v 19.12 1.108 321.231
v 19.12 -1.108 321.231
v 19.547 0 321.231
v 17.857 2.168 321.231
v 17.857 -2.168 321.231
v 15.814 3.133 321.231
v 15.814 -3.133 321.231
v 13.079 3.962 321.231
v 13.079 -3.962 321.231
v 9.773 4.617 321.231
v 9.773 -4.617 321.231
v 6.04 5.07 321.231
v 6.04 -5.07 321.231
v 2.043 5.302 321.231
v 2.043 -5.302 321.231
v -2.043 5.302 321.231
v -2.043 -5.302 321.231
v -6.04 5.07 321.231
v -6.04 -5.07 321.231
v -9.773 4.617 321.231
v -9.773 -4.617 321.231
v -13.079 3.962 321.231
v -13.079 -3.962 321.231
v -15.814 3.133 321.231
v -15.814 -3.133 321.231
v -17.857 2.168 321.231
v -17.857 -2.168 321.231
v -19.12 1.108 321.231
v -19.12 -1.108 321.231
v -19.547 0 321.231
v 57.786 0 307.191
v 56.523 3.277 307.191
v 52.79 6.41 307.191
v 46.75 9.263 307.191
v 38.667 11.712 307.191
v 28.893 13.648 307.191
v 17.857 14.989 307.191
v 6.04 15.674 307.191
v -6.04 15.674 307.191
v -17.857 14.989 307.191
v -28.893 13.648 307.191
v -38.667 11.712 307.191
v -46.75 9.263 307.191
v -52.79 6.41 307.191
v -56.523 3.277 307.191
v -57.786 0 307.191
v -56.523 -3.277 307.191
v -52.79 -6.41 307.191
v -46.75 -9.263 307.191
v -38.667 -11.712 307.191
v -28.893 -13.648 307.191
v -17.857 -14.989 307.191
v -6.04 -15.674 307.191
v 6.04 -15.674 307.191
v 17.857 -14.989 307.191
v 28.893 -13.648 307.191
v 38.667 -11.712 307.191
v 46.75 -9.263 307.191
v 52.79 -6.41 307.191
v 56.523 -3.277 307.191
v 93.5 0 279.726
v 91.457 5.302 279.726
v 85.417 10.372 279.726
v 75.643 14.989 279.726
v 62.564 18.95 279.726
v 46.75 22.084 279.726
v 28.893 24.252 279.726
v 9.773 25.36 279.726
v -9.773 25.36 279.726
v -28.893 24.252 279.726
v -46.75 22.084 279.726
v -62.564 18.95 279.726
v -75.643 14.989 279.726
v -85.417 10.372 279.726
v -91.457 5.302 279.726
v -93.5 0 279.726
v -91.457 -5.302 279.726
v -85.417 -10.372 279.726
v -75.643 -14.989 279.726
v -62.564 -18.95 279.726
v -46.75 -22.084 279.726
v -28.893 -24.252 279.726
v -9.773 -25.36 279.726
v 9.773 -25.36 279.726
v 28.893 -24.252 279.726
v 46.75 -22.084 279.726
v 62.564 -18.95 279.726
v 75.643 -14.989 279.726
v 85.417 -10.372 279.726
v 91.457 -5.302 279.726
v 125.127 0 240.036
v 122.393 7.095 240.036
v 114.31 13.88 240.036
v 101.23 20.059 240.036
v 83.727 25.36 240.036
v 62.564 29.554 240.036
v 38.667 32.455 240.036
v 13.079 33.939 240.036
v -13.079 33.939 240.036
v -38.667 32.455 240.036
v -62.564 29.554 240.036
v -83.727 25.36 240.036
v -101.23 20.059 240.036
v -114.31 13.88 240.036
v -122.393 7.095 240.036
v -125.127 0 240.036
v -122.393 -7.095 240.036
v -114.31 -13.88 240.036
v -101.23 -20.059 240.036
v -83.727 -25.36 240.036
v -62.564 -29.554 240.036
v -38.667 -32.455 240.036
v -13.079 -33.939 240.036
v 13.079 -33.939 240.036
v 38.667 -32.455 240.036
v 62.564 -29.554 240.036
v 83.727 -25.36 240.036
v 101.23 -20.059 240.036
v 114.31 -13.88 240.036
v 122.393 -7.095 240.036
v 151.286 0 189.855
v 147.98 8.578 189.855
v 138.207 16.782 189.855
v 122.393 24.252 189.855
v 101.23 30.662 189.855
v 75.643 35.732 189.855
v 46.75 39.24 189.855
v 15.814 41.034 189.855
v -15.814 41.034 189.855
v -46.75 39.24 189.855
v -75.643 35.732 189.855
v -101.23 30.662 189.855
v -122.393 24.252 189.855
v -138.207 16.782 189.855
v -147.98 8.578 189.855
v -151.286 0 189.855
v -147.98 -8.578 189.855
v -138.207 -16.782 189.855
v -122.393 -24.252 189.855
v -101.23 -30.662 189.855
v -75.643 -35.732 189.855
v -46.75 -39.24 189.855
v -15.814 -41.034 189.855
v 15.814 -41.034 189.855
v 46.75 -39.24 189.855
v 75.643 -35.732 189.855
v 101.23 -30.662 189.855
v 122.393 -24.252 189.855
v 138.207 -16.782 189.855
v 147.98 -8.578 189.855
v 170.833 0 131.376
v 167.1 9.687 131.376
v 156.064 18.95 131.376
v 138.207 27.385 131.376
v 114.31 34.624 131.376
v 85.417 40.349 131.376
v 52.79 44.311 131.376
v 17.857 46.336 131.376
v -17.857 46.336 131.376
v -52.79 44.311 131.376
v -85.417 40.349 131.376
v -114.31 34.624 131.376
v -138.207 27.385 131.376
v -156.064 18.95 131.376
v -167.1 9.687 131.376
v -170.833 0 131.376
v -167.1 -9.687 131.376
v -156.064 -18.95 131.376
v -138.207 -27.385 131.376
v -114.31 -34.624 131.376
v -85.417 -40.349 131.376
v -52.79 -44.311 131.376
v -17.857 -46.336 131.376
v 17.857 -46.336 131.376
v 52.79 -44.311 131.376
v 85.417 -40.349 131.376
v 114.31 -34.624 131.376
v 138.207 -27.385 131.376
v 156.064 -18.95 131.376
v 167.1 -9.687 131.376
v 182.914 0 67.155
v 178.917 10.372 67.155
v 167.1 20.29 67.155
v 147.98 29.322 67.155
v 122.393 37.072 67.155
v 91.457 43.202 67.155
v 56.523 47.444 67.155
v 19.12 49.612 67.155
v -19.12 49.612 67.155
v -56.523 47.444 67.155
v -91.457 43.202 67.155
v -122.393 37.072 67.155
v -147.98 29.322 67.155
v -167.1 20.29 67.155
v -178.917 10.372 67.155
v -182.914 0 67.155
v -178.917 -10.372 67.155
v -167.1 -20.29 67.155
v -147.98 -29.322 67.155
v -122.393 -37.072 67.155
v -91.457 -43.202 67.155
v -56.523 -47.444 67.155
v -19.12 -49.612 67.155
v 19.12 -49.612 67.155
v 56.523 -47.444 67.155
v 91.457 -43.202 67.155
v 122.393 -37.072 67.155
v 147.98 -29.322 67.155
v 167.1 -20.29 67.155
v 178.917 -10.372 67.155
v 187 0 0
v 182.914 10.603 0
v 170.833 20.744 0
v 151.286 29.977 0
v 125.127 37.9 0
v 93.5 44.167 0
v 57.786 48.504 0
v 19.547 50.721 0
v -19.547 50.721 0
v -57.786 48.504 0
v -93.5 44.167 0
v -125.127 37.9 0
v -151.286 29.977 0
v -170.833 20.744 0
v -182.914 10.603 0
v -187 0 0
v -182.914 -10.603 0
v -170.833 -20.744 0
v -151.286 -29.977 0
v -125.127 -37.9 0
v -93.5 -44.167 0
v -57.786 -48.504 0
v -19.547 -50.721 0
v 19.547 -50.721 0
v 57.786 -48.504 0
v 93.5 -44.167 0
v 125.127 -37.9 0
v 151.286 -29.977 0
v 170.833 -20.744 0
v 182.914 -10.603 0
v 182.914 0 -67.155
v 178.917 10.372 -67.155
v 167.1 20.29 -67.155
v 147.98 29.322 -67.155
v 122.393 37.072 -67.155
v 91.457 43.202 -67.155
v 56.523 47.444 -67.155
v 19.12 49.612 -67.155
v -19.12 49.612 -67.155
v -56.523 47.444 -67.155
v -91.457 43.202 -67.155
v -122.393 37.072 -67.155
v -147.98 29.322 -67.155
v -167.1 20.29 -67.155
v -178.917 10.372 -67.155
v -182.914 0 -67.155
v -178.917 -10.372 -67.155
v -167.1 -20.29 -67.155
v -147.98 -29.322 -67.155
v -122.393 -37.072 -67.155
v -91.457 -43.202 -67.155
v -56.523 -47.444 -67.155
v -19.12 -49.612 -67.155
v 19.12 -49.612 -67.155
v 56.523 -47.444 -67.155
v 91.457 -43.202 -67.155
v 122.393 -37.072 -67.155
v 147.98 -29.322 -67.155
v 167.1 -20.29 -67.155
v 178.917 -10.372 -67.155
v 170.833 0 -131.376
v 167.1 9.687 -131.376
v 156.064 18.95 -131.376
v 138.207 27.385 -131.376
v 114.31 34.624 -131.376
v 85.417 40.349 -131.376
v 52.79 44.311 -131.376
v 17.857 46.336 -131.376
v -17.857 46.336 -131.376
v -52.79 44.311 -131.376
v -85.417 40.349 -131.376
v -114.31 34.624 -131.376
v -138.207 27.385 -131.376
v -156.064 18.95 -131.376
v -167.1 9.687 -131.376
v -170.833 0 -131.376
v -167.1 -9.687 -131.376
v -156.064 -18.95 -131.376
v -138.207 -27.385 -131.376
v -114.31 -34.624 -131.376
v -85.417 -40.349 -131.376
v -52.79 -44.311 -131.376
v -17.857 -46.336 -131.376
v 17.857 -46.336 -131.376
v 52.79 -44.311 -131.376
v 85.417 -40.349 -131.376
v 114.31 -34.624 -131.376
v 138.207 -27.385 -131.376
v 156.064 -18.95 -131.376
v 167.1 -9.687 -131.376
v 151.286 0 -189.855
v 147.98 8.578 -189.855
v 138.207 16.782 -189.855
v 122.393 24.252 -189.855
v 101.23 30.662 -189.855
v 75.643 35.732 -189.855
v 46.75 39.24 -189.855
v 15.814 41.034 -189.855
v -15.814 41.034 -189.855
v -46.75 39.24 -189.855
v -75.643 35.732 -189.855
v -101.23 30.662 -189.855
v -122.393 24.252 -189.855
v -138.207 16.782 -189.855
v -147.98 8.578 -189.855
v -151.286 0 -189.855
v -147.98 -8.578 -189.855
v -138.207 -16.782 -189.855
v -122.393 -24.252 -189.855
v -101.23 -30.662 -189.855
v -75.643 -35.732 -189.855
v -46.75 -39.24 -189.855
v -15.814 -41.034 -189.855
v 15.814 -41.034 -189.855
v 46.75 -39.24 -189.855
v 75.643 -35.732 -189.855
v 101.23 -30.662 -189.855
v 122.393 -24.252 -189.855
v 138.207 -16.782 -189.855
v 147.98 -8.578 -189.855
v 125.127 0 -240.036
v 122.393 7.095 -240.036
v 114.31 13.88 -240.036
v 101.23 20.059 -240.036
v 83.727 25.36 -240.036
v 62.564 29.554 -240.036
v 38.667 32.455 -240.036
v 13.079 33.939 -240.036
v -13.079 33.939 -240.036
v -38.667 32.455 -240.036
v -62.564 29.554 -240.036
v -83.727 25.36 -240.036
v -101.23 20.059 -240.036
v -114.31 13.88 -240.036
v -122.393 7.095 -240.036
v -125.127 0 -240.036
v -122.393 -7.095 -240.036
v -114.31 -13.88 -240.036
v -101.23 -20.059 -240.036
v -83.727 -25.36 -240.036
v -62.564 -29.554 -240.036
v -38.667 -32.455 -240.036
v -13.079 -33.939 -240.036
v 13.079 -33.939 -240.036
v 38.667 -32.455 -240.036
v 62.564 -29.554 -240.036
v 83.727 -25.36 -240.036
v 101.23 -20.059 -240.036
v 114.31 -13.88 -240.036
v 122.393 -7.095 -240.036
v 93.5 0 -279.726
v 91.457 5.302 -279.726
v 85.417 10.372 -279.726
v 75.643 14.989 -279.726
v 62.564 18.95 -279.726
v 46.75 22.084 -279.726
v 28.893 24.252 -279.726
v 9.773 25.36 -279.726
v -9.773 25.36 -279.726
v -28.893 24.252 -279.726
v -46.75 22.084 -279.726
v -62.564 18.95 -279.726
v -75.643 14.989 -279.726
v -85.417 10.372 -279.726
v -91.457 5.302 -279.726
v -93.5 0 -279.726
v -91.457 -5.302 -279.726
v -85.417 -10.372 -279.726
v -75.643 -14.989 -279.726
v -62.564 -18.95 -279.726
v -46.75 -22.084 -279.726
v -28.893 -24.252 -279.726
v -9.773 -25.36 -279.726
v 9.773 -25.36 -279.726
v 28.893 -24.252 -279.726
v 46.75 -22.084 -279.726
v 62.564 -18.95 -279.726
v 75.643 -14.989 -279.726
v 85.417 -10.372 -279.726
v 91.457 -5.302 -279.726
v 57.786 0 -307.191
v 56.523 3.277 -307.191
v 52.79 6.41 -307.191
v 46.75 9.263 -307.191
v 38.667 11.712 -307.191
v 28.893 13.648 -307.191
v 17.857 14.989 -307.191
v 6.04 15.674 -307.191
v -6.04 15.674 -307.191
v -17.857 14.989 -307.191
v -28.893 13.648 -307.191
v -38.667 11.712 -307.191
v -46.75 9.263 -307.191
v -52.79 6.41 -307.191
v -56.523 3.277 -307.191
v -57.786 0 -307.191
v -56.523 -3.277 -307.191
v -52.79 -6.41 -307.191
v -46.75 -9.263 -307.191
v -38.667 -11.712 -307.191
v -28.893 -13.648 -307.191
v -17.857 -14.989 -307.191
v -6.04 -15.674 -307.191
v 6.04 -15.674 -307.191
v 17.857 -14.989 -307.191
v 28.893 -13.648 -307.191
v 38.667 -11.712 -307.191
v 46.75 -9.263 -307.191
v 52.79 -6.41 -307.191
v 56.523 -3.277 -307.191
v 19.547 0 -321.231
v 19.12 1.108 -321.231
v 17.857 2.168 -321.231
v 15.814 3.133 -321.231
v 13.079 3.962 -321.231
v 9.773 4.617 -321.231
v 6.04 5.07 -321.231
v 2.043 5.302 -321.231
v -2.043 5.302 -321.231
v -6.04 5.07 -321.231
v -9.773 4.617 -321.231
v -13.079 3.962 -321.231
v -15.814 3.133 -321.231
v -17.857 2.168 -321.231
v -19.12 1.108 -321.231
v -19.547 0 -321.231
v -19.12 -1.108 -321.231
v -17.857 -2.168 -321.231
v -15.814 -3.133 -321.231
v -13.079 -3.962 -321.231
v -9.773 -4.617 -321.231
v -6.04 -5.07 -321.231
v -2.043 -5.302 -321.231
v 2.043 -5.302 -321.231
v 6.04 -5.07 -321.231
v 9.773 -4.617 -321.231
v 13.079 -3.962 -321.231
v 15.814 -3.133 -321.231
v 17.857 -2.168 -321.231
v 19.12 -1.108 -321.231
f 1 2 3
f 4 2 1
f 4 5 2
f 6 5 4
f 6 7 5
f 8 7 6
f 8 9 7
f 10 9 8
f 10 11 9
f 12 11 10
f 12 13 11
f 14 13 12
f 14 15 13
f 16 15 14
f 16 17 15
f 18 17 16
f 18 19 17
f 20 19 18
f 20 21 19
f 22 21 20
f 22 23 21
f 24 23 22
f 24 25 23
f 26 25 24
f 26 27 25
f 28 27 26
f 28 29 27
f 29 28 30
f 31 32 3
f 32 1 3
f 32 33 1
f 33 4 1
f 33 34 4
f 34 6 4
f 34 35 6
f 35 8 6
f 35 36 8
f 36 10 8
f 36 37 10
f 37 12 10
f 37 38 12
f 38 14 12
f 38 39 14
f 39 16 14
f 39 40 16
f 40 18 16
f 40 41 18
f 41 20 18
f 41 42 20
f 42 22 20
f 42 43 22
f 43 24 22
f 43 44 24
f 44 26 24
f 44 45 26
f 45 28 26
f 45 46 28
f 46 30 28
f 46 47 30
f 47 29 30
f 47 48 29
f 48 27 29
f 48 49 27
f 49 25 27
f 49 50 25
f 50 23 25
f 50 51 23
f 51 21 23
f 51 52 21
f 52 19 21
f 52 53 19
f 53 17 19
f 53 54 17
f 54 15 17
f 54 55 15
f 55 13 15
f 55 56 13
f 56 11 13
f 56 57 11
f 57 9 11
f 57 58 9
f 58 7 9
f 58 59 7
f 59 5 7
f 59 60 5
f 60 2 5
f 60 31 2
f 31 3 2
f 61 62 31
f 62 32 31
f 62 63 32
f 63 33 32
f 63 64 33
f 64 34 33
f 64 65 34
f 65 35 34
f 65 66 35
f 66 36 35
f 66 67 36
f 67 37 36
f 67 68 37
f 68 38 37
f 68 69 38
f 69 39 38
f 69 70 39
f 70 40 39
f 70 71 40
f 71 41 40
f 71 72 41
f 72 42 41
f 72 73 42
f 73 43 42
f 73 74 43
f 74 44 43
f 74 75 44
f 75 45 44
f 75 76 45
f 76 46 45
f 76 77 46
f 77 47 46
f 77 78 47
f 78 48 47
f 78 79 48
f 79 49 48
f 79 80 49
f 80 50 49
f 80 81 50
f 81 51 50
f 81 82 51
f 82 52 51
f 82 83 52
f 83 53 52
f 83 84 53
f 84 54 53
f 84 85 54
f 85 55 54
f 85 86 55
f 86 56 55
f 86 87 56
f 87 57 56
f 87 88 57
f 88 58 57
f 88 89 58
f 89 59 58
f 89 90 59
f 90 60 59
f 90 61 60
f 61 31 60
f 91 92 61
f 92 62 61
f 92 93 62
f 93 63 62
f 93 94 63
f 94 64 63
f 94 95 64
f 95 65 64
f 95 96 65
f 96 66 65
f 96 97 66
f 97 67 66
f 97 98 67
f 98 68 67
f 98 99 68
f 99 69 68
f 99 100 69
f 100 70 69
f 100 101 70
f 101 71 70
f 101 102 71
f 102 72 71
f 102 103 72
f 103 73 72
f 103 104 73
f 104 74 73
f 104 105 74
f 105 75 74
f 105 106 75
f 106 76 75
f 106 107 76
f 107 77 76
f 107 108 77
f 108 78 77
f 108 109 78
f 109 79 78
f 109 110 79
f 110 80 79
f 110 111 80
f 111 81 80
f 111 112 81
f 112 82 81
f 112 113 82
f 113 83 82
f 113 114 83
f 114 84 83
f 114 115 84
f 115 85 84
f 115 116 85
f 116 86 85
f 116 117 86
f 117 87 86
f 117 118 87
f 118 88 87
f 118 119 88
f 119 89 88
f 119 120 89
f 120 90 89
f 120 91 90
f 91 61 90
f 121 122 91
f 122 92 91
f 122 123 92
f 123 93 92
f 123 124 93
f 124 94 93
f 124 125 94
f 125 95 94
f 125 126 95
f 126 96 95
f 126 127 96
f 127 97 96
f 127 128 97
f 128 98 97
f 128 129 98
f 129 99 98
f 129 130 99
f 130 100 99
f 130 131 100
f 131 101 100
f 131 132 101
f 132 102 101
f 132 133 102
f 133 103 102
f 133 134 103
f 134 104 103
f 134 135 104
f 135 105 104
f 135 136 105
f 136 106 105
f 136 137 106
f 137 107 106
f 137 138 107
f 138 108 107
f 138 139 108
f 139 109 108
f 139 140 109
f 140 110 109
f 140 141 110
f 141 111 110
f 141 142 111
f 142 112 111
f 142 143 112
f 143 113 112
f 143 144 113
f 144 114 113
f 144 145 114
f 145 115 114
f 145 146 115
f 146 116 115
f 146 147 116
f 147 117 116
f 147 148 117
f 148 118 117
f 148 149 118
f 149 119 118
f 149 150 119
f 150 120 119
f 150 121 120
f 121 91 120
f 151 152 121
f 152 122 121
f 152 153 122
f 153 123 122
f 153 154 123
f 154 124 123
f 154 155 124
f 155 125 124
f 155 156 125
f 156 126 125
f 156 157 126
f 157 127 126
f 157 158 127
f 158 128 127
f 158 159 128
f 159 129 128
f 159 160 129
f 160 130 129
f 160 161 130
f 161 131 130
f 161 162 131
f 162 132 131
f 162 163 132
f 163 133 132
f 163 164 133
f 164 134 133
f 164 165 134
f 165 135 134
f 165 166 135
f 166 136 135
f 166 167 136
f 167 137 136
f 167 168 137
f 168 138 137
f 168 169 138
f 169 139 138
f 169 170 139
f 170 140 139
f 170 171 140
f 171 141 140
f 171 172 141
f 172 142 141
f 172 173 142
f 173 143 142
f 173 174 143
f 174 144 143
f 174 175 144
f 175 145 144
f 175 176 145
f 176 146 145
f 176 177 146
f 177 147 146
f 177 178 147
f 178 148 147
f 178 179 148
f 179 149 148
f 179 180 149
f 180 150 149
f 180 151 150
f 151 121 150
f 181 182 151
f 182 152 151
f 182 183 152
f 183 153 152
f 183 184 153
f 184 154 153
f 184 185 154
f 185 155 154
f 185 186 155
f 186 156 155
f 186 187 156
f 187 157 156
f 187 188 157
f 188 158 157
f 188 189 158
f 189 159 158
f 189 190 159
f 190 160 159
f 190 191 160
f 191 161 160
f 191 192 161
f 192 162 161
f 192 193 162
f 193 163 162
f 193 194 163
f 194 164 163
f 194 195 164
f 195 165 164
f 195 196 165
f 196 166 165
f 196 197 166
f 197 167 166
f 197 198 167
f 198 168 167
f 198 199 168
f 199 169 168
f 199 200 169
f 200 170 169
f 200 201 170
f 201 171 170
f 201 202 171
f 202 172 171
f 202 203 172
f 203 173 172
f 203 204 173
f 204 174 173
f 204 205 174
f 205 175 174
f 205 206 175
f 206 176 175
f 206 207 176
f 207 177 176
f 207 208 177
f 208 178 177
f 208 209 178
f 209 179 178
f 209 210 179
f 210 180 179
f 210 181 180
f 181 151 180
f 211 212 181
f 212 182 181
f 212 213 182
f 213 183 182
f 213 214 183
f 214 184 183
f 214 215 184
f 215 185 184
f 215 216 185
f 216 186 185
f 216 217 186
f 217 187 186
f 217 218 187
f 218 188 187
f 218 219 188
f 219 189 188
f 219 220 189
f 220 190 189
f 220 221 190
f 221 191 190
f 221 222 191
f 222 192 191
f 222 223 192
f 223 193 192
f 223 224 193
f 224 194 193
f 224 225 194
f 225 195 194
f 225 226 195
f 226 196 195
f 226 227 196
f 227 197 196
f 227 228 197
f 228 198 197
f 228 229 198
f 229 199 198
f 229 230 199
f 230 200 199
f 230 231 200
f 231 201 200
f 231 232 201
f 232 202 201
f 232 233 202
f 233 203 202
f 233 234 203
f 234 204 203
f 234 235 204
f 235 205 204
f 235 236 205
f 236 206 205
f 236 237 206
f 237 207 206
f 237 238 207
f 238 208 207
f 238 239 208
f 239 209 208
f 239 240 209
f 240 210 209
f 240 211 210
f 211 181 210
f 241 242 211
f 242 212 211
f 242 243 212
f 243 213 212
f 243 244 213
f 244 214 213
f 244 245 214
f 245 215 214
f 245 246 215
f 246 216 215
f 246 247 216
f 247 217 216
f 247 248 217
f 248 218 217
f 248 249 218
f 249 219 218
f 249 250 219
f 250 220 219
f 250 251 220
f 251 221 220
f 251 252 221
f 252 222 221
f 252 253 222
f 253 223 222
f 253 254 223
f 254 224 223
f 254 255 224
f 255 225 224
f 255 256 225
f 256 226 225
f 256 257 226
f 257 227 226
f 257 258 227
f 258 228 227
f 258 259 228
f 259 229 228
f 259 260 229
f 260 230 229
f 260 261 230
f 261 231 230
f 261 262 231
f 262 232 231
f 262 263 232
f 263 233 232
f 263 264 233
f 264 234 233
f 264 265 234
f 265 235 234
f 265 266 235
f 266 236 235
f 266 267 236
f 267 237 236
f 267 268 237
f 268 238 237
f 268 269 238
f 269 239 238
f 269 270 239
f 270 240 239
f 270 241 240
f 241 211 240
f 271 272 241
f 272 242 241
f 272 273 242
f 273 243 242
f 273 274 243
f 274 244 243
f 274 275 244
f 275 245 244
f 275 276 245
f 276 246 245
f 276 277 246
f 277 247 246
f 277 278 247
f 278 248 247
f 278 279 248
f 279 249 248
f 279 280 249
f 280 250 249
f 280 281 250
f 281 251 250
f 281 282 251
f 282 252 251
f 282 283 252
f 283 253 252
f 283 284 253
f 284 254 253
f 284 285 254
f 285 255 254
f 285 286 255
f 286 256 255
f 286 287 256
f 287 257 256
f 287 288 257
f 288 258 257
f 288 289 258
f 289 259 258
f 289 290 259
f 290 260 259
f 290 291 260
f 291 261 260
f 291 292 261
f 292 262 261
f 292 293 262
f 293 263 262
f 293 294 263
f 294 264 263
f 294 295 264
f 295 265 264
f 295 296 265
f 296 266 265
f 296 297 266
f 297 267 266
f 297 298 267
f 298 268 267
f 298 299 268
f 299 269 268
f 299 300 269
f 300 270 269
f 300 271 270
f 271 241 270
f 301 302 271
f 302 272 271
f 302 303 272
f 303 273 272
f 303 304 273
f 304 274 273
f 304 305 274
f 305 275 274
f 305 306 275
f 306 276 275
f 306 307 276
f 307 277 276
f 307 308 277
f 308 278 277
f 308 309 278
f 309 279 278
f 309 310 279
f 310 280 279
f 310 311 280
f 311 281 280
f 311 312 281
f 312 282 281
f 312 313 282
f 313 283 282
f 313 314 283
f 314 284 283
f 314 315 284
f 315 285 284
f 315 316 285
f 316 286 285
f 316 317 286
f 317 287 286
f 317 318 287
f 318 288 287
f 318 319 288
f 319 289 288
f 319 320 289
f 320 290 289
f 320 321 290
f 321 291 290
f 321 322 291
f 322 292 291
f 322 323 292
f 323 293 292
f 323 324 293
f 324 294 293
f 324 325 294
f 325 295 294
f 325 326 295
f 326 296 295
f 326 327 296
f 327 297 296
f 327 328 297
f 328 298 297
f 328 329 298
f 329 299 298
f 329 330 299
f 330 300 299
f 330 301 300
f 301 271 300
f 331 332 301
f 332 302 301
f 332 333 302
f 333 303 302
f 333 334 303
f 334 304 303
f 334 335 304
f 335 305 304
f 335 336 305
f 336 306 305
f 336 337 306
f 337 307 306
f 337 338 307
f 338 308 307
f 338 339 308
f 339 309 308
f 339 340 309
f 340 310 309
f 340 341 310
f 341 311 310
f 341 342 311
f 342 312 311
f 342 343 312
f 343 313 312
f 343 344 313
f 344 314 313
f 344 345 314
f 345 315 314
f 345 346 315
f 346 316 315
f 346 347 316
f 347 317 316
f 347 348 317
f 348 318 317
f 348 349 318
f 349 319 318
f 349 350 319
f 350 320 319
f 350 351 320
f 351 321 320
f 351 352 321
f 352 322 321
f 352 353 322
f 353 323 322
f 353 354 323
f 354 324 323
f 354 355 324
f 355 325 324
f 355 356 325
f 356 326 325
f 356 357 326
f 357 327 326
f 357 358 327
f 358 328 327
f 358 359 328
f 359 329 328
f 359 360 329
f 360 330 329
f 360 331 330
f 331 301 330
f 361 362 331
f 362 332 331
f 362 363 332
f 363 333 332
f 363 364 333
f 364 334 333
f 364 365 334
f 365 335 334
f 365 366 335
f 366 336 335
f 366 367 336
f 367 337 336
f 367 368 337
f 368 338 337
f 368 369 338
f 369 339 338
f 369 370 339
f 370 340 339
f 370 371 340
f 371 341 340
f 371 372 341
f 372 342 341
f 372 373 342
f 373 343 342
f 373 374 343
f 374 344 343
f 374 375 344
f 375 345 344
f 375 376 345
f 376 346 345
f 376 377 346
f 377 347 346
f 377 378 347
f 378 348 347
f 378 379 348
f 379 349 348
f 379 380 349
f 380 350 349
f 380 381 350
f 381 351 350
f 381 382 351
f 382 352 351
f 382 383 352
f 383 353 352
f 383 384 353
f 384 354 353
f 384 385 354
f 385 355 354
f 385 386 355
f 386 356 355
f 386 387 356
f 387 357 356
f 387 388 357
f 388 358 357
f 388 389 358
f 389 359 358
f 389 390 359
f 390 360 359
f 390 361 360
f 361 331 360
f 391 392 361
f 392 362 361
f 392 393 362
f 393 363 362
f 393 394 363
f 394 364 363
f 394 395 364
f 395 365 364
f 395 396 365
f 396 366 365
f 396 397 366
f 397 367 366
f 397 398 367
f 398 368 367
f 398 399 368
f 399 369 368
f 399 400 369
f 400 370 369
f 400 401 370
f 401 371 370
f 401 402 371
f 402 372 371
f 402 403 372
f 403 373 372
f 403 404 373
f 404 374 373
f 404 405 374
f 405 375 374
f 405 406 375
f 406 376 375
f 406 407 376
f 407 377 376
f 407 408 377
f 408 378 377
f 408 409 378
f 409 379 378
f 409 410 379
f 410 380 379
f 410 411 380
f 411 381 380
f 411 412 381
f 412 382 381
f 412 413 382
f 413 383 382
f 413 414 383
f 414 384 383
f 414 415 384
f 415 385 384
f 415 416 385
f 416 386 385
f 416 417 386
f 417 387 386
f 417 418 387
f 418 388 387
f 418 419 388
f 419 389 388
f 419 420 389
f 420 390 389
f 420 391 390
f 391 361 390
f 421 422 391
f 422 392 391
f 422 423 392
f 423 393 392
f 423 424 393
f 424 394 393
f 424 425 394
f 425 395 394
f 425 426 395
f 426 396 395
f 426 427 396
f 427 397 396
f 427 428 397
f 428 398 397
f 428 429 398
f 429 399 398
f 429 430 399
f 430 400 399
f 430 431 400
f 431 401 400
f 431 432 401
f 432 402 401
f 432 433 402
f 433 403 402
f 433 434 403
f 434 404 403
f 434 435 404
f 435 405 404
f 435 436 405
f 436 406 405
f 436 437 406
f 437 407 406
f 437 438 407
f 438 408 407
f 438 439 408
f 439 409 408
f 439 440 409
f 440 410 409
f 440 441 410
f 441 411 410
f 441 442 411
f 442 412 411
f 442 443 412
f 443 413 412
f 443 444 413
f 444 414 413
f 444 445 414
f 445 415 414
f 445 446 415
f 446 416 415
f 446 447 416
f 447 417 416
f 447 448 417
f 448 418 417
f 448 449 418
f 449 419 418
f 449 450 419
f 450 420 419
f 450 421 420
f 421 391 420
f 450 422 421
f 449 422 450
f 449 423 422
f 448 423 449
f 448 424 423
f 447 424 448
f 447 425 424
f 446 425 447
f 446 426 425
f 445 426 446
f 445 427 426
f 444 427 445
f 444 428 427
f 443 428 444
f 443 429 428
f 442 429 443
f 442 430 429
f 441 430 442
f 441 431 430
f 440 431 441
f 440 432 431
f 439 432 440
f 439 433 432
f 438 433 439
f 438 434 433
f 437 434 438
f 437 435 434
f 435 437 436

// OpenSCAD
// Generated by SolidPython 1.0.1 on 2020-07-29 00:46:49


scale(v = [11, 3, 19]) {
	sphere(r = 17);
}
/***********************************************
*********      SolidPython code:      **********
************************************************
 
# import packages: SolidPython
from solid import *
from solid.utils import *
from itertools import chain, combinations, permutations


class Resize:

    def __init__(self, scad_file):
        self.scad_file = scad_file
        #self.scad_file = import_scad(scad_file)
        # cone/cylinder param:
        self.r1 = 0
        self.r2 = 0
        self.h = 0
        # rectangular prism param:
        self.w = 0
        self.l = 0
        # ellipse param:
        self.r = 0

    # import OpenScad code (file name corresponds to shape)


    # classify shape + parameters
    def assign(self, param1, param2, param3):
        if self.scad_file == 'cone.scad':
            self.r1 = param1
            self.r2 = param2
            self.h = param3
        elif self.scad_file == 'cylinder.scad':
            self.r1 = param1
            self.r2 = param2
            self.h = param3
        elif self.scad_file == 'rectangularPrism.scad':
            self.h = param1
            self.l = param2
            self.w = param3
        else:
            self.r = param1
            self.h = param2

    # resize parameters
    def iterate(self):
        x = range(3, 20, 2)
        i = 1
        if self.scad_file == 'cone.scad':
            tempList = list(permutations(x, 2))
            for temp in tempList:
                param1 = temp[0]
                param2 = temp[1]
                filepath = 'produced_scad_files/' + 'cone' + str(param1) + '_' + str(param2) + '_' + '.scad'
                scad_render_to_file(cylinder(h=param1, r1=param2, r2=0), filepath)

        elif self.scad_file == 'cylinder.scad':
            tempList = list(permutations(x, 3))
            for temp in tempList:
                param1 = temp[0]
                param2 = temp[1]
                filepath = 'produced_scad_files/' + 'cylinder' + str(param1) + '_' + str(param2) + '_' + '.scad'
                scad_render_to_file(cylinder(h=param1, r1=param2, r2=param2), filepath)

        elif self.scad_file == 'rectangularPrism.scad':
            tempList = list(permutations(x, 3))
            for temp in tempList:
                param1 = temp[0]
                param2 = temp[1]
                param3 = temp[2]
                filepath = 'produced_scad_files/' + 'rectangularPrism' + str(param1) + '_' + str(param2) + '_' + str(
                    param3) + '.scad'
                scad_render_to_file(cube(size=(param1, param2, param3)), filepath)

        elif self.scad_file == 'ellipse.scad':
            tempList = list(permutations(x, 4))
            for temp in tempList:
                param1 = temp[0]
                param2 = temp[1]
                param3 = temp[2]
                param4 = temp[3]
                filepath = 'produced_scad_files/' + 'ellipse' + str(param1) + '_' + str(param2) + '_' + str(param3) + '_' + str(param4) + '.scad'
                scad_render_to_file(scale([param1, param2, param3])(sphere(r=param4)), filepath)

    def render_to_scadfile(self):
        scad_render_to_file(scad, 'example.scad') 
 
************************************************/
